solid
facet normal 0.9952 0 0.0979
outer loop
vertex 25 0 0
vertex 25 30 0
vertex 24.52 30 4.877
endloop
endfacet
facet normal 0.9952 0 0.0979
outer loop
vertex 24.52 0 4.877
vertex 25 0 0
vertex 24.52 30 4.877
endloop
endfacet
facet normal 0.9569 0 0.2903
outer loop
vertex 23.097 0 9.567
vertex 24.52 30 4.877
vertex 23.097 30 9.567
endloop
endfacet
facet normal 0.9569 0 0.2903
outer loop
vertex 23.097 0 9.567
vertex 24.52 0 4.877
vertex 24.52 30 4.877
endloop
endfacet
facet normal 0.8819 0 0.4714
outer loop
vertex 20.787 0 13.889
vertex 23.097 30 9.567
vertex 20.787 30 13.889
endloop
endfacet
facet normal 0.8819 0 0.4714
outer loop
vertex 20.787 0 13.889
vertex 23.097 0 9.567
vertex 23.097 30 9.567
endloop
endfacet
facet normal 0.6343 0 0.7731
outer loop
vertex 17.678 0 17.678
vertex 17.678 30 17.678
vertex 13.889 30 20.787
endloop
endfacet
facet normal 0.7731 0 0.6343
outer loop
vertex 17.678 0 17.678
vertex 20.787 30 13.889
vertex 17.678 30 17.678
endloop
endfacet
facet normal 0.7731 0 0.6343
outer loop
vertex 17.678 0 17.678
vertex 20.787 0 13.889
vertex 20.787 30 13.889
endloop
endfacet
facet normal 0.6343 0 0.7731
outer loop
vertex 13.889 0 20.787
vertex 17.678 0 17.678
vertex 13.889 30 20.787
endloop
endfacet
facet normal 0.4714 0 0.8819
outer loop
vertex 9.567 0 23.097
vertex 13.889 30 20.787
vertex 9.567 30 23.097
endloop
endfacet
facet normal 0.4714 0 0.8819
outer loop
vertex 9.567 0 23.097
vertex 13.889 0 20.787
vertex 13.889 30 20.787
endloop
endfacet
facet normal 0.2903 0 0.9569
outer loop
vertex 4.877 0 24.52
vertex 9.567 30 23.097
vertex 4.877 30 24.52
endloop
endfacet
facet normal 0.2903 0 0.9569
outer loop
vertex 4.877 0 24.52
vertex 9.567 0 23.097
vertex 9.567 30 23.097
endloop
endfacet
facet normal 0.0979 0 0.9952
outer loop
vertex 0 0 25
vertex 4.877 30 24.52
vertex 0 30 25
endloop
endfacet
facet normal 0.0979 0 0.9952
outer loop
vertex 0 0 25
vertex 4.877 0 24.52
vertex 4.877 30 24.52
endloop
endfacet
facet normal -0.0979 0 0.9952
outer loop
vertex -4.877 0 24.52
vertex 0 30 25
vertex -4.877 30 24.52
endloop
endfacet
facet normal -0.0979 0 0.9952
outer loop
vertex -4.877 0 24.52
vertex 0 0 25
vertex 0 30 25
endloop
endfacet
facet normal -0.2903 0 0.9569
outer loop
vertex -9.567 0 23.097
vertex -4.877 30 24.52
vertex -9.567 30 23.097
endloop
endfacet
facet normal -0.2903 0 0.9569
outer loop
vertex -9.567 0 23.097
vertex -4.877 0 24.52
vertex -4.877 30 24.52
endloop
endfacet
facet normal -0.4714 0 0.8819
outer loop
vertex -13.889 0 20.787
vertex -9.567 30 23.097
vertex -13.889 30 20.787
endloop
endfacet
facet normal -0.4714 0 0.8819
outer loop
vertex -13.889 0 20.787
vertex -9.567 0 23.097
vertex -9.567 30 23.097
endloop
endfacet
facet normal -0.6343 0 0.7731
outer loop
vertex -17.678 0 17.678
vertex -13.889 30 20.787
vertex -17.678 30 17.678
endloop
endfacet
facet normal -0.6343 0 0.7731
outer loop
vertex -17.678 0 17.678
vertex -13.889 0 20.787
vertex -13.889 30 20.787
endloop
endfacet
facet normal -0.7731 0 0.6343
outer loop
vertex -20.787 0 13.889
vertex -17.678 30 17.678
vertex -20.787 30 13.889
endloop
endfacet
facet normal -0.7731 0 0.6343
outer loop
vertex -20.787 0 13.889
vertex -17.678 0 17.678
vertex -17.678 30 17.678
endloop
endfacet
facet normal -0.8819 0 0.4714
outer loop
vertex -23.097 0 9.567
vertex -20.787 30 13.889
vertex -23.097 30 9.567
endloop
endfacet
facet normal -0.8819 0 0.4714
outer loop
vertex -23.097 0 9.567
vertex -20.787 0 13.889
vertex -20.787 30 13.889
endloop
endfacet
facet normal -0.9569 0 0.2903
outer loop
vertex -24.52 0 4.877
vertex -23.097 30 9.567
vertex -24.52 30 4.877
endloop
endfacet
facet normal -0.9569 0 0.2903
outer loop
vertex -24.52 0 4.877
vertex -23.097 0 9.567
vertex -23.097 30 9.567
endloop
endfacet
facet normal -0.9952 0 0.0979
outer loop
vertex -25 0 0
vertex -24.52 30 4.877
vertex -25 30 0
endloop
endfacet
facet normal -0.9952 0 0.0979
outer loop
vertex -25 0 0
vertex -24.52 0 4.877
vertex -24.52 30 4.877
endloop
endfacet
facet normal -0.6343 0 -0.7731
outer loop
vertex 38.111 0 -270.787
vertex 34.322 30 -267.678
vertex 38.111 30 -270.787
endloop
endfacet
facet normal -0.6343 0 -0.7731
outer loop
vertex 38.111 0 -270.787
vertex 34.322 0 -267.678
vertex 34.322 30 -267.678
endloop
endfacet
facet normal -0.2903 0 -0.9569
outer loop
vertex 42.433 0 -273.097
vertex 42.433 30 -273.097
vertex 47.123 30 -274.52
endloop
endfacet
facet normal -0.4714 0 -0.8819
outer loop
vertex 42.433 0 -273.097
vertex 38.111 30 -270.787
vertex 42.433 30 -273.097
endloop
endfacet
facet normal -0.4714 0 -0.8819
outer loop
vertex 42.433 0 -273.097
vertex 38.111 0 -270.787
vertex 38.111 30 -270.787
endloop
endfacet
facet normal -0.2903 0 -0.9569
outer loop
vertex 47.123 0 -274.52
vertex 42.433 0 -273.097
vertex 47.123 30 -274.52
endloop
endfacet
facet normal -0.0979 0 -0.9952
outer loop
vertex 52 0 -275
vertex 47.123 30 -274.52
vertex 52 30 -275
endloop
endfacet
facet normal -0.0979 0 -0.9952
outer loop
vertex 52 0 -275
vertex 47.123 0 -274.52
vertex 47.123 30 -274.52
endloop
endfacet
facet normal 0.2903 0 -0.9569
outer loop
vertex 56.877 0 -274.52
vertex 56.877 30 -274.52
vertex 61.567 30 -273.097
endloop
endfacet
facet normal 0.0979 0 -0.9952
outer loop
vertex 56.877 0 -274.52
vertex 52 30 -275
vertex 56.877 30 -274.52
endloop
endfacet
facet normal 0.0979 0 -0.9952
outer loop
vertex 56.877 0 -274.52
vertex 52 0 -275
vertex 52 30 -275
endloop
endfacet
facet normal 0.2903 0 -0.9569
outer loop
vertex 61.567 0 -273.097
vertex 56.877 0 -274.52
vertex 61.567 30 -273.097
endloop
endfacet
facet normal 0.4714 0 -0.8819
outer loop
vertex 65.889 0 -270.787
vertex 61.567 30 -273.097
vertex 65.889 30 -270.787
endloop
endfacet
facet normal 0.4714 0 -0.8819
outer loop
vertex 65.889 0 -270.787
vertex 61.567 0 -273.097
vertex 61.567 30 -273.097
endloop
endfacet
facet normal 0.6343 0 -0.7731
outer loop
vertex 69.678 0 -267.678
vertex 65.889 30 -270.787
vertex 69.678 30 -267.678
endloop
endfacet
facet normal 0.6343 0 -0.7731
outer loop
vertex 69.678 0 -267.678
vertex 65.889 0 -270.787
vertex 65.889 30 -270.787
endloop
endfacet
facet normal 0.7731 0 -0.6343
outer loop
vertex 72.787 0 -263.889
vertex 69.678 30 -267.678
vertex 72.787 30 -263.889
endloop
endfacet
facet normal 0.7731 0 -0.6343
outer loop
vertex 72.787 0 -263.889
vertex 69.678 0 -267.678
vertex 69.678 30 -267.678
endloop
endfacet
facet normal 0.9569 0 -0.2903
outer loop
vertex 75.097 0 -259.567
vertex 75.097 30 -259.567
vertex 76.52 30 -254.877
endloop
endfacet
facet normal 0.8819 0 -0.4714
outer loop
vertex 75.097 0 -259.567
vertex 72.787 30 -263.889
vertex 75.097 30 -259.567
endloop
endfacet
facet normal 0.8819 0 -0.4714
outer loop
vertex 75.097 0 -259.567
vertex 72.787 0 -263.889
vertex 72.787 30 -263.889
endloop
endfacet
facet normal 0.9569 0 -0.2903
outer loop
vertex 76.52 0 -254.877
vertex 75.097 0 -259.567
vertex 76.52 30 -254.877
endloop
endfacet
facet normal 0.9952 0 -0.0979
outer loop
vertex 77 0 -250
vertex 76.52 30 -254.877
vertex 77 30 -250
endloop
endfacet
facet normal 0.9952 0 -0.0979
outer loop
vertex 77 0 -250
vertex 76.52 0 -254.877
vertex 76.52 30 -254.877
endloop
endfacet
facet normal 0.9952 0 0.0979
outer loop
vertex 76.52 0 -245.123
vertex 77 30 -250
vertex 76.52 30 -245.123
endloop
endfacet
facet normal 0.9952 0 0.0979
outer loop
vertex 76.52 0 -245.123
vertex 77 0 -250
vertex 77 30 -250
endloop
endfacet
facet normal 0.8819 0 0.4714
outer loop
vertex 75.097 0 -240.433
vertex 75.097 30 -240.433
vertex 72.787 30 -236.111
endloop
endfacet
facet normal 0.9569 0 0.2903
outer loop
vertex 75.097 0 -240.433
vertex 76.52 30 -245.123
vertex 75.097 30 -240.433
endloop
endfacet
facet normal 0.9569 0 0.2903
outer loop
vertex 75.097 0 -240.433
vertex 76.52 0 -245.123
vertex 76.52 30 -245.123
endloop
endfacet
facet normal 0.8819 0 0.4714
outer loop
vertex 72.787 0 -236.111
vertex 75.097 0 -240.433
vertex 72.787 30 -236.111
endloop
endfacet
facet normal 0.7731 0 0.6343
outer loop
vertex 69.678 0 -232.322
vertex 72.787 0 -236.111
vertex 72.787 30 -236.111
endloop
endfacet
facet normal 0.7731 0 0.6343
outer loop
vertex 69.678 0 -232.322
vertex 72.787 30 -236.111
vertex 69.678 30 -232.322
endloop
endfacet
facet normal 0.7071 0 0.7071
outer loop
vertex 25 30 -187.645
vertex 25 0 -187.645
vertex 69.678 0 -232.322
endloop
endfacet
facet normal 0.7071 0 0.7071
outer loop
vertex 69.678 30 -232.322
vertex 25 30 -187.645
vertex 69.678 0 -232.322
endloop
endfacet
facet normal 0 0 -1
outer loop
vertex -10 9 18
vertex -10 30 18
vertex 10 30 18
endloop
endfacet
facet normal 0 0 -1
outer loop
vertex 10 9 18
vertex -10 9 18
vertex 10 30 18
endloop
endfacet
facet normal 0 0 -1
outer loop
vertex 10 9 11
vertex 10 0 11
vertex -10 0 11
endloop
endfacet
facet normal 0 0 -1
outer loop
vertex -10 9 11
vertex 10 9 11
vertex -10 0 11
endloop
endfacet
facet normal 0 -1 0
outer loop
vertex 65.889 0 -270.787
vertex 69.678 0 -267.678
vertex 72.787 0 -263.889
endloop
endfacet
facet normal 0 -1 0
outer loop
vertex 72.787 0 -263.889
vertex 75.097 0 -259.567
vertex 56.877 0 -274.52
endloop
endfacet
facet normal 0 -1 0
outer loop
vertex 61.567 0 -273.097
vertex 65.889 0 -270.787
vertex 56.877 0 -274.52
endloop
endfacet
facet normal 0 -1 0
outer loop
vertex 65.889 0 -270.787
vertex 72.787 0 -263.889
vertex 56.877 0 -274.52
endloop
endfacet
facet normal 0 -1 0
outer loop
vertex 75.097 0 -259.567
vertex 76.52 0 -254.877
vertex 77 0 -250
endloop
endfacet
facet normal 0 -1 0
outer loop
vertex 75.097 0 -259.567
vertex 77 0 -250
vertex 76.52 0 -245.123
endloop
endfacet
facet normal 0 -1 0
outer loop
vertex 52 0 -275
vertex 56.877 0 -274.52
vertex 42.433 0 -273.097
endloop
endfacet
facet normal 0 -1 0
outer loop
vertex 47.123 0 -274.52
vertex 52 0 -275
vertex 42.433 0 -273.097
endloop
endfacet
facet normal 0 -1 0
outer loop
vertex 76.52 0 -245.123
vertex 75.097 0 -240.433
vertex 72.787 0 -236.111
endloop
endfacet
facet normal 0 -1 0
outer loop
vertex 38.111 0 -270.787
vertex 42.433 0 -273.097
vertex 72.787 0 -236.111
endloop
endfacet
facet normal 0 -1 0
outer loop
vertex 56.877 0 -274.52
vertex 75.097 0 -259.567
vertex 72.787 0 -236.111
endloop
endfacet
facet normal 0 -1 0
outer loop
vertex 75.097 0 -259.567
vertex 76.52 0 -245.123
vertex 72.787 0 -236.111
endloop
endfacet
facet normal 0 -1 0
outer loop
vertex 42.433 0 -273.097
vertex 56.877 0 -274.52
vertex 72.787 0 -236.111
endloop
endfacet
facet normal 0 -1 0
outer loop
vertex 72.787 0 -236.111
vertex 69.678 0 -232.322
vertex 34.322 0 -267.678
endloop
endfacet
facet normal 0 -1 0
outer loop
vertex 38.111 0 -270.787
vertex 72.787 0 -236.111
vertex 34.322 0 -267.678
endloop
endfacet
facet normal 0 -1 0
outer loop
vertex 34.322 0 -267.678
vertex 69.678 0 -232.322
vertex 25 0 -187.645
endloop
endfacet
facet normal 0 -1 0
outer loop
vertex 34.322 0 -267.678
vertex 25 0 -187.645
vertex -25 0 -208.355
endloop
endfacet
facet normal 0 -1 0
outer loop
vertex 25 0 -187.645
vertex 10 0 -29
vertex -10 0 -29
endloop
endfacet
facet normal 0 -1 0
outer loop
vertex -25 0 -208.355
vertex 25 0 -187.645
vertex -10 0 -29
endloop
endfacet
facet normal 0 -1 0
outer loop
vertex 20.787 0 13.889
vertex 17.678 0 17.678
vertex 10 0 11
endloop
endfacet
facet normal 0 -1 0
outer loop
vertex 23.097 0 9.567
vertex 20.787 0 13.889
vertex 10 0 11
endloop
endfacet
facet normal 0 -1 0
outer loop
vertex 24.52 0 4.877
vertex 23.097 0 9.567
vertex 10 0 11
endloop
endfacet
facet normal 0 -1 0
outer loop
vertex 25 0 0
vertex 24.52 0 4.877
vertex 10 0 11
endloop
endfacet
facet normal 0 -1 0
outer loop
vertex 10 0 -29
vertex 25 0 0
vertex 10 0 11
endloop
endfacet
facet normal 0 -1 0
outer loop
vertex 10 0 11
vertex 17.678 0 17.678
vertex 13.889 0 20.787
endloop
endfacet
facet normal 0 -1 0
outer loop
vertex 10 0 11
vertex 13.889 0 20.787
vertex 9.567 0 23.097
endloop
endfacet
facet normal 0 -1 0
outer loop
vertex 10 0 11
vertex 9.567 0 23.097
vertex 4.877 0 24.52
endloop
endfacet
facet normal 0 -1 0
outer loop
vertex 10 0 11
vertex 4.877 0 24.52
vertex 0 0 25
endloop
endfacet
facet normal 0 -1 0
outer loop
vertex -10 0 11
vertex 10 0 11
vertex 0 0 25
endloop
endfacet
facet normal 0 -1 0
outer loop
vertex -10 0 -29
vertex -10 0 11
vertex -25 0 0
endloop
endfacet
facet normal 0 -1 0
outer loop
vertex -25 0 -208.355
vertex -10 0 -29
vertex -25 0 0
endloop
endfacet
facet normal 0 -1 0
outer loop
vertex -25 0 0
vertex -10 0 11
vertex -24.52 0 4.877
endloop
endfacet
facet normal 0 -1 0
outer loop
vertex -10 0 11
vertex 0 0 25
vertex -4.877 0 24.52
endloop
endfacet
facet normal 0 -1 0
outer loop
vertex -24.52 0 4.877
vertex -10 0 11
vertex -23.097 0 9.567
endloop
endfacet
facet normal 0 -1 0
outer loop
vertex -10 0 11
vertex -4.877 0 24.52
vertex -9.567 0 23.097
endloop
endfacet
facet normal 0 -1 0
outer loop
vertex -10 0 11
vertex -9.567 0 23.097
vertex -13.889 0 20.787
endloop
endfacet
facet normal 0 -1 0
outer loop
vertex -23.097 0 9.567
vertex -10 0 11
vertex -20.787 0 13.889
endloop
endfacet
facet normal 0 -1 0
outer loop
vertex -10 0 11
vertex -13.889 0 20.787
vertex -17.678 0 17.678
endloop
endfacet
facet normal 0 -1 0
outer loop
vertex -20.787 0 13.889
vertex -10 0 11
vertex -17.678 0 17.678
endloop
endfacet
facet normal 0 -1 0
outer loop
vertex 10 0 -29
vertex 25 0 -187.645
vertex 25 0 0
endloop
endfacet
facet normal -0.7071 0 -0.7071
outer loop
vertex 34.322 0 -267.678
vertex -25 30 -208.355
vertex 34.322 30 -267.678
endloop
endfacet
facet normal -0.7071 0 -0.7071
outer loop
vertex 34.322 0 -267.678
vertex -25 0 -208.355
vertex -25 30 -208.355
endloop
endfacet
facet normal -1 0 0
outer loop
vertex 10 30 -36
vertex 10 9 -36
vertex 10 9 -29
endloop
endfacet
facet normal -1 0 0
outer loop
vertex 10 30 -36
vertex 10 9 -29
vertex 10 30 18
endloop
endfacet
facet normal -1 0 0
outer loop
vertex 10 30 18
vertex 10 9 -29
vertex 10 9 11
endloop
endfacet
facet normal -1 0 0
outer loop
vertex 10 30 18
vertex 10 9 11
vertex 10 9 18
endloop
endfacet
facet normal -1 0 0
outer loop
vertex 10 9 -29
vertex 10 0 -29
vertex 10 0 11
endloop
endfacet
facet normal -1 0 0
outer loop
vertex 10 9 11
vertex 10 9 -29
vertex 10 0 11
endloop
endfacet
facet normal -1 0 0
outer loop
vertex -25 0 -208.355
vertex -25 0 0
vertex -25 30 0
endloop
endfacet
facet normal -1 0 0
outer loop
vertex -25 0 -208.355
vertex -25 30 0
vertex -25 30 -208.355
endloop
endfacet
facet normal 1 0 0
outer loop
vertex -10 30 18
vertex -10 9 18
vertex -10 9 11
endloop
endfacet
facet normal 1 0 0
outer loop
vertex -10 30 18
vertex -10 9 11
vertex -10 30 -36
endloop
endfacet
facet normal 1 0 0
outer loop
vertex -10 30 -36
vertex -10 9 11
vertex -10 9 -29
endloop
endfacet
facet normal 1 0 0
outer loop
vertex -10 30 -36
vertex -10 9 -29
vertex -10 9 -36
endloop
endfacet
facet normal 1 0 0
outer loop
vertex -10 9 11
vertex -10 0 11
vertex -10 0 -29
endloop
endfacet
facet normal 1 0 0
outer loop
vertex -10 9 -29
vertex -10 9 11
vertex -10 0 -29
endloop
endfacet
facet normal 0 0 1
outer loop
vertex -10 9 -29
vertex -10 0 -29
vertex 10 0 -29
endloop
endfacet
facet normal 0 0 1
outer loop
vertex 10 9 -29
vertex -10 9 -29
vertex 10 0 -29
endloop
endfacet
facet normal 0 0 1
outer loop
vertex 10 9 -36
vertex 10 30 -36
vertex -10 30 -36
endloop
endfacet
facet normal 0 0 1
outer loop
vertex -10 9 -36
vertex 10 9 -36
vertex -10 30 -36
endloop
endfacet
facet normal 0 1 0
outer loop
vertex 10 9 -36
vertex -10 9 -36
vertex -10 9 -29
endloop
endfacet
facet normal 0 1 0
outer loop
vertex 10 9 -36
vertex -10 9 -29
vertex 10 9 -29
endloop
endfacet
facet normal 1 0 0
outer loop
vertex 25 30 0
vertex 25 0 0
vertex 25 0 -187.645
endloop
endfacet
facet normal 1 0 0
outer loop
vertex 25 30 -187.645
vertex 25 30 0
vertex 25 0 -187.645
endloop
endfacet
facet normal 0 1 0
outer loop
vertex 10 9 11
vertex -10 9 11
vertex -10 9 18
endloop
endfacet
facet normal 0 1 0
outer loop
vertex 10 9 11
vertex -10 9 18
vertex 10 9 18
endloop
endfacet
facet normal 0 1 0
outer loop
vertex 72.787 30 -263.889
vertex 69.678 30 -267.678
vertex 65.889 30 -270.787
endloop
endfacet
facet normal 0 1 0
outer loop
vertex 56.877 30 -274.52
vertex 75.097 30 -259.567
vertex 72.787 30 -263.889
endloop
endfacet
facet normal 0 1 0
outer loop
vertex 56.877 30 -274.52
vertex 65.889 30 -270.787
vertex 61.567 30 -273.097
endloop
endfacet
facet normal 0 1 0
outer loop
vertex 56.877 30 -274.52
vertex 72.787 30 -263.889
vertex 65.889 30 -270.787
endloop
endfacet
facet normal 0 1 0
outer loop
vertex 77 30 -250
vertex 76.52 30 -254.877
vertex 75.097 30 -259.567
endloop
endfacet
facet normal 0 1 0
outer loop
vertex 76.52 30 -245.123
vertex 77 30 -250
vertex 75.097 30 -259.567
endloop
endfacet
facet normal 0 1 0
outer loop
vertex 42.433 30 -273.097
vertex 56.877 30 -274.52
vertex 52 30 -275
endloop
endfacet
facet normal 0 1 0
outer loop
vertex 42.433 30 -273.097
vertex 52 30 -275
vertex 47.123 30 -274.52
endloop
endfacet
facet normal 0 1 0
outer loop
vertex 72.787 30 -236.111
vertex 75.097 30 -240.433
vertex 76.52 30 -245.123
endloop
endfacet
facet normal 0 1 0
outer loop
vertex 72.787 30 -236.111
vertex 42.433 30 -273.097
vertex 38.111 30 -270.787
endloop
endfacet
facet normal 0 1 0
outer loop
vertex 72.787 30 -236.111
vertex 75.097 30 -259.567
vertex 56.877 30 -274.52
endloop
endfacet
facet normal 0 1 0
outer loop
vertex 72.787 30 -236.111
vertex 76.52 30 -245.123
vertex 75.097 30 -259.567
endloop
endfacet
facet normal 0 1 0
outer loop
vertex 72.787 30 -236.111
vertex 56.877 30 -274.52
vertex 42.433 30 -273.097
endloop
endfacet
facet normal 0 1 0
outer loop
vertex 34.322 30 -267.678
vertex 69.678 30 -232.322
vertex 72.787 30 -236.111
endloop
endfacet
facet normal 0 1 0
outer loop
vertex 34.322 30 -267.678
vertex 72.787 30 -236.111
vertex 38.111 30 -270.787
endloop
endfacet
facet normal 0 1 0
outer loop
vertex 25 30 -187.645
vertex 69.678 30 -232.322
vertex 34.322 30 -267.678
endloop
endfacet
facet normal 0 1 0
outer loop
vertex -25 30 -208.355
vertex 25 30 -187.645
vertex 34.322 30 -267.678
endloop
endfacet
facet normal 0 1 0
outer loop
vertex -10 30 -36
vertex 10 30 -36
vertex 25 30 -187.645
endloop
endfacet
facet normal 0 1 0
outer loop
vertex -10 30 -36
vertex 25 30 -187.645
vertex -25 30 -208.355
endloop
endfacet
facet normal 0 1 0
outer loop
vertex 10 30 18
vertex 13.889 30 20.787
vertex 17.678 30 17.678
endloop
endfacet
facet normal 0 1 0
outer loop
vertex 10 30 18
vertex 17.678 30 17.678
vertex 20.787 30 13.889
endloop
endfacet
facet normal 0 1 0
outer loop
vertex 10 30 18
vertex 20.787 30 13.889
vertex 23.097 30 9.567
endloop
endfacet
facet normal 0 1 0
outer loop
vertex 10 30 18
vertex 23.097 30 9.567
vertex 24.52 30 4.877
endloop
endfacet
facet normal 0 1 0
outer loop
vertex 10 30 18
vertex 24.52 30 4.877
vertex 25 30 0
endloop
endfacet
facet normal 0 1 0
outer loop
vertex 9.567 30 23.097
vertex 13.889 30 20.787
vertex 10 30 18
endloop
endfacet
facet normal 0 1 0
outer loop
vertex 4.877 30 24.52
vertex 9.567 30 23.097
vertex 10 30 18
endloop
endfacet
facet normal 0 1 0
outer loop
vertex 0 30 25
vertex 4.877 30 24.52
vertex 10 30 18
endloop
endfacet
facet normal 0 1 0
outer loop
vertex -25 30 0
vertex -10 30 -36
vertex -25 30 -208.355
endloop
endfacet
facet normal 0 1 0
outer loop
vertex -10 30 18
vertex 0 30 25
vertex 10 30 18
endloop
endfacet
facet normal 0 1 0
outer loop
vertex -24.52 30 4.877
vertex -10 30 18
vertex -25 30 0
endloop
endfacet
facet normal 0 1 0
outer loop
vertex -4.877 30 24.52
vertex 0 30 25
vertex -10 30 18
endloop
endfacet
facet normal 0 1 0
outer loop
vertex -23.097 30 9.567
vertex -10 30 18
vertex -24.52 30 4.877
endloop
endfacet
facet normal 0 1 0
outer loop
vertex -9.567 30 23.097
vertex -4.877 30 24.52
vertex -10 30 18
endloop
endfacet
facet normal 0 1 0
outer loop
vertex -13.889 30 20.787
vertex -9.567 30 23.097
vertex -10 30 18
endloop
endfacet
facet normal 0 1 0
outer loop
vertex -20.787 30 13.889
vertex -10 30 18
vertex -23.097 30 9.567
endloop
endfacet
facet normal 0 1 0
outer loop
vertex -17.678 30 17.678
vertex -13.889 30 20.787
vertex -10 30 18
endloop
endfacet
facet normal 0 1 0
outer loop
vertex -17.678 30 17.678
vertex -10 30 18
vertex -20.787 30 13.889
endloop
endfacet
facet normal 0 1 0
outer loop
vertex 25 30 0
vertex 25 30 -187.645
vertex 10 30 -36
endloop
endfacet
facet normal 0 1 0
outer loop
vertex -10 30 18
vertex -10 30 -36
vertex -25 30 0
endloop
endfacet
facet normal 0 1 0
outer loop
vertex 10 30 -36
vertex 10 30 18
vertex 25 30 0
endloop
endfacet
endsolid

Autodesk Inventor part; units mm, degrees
ref_plane "YZ Plane" through (0, 0, 0) normal (1, 0, 0) x (0, 1, 0)
ref_plane "XZ Plane" through (0, 0, 0) normal (0, 1, 0) x (-1, 0, 0)
ref_plane "XY Plane" through (0, 0, 0) normal (0, 0, 1) x (1, 0, 0)
sketch "Sketch1" plane through (0, 0, 0) normal (0, 1, 0) x (-1, 0, 0)
  circle A0 centre (0, 0) radius 25
  line L0 (25, 0) -> (25, -208.3553)
  line L1 (25, -208.3553) -> (-34.3223, -267.6777)
  line L2 (-25, 0) -> (-25, -187.6447)
  line L3 (-25, -187.6447) -> (-69.6777, -232.3223)
  circle A1 centre (-52, -250) radius 25
  dimension "d0" = 50
  dimension "d1" = 50
  dimension "d2" = 250
  dimension "d3" = 27
  dimension "d4" = 135
extrude "Extrusion1" add sketch "Sketch1" along normal blind 30
sketch "Sketch2" plane through (0, 0, 0) normal (0, -1, 0) x (1, 0, 0)
  line L0 (-10, -36) -> (10, -36)
  line L1 (10, -36) -> (10, 18)
  line L2 (10, 18) -> (-10, 18)
  line L3 (-10, 18) -> (-10, -36)
  line L4 (-10, -29) -> (10, -29)
  line L5 (10, -29) -> (10, 11)
  line L6 (10, 11) -> (-10, 11)
  line L7 (-10, 11) -> (-10, -29)
  point P0 (0, 0)
  point P1 (-10, 11)
  dimension "d7" = 54
  dimension "d8" = 20
  dimension "d9" = 10
  dimension "d10" = 7
  dimension "d11" = 40
  dimension "d12" = 36
extrude "Extrusion2" cut sketch "Sketch2" against normal through all contours L3 L6 L1 L4
sketch "Sketch3" plane through (0, 30, 0) normal (0, 1, 0) x (1, 0, 0)
  line L0 (-10, -18) -> (10, -18)
  line L1 (10, -18) -> (10, 36)
  line L2 (10, 36) -> (-10, 36)
  line L3 (-10, 36) -> (-10, -18)
  line L4 (10, -11) -> (-10, -11) projected
  line L5 (-10, 29) -> (10, 29) projected
  point P0 (0, 0)
  dimension "d15" = 7
  dimension "d16" = 7
extrude "Extrusion3" cut sketch "Sketch3" against normal blind 21 contours L3 L4 L1 L0 | L3 L2 L1 L5
sketch "Sketch4" plane through (0, 30, 0) normal (0, 1, 0) x (1, 0, 0)
  point P0 (0, 0)
properties part number "Arm 1"
